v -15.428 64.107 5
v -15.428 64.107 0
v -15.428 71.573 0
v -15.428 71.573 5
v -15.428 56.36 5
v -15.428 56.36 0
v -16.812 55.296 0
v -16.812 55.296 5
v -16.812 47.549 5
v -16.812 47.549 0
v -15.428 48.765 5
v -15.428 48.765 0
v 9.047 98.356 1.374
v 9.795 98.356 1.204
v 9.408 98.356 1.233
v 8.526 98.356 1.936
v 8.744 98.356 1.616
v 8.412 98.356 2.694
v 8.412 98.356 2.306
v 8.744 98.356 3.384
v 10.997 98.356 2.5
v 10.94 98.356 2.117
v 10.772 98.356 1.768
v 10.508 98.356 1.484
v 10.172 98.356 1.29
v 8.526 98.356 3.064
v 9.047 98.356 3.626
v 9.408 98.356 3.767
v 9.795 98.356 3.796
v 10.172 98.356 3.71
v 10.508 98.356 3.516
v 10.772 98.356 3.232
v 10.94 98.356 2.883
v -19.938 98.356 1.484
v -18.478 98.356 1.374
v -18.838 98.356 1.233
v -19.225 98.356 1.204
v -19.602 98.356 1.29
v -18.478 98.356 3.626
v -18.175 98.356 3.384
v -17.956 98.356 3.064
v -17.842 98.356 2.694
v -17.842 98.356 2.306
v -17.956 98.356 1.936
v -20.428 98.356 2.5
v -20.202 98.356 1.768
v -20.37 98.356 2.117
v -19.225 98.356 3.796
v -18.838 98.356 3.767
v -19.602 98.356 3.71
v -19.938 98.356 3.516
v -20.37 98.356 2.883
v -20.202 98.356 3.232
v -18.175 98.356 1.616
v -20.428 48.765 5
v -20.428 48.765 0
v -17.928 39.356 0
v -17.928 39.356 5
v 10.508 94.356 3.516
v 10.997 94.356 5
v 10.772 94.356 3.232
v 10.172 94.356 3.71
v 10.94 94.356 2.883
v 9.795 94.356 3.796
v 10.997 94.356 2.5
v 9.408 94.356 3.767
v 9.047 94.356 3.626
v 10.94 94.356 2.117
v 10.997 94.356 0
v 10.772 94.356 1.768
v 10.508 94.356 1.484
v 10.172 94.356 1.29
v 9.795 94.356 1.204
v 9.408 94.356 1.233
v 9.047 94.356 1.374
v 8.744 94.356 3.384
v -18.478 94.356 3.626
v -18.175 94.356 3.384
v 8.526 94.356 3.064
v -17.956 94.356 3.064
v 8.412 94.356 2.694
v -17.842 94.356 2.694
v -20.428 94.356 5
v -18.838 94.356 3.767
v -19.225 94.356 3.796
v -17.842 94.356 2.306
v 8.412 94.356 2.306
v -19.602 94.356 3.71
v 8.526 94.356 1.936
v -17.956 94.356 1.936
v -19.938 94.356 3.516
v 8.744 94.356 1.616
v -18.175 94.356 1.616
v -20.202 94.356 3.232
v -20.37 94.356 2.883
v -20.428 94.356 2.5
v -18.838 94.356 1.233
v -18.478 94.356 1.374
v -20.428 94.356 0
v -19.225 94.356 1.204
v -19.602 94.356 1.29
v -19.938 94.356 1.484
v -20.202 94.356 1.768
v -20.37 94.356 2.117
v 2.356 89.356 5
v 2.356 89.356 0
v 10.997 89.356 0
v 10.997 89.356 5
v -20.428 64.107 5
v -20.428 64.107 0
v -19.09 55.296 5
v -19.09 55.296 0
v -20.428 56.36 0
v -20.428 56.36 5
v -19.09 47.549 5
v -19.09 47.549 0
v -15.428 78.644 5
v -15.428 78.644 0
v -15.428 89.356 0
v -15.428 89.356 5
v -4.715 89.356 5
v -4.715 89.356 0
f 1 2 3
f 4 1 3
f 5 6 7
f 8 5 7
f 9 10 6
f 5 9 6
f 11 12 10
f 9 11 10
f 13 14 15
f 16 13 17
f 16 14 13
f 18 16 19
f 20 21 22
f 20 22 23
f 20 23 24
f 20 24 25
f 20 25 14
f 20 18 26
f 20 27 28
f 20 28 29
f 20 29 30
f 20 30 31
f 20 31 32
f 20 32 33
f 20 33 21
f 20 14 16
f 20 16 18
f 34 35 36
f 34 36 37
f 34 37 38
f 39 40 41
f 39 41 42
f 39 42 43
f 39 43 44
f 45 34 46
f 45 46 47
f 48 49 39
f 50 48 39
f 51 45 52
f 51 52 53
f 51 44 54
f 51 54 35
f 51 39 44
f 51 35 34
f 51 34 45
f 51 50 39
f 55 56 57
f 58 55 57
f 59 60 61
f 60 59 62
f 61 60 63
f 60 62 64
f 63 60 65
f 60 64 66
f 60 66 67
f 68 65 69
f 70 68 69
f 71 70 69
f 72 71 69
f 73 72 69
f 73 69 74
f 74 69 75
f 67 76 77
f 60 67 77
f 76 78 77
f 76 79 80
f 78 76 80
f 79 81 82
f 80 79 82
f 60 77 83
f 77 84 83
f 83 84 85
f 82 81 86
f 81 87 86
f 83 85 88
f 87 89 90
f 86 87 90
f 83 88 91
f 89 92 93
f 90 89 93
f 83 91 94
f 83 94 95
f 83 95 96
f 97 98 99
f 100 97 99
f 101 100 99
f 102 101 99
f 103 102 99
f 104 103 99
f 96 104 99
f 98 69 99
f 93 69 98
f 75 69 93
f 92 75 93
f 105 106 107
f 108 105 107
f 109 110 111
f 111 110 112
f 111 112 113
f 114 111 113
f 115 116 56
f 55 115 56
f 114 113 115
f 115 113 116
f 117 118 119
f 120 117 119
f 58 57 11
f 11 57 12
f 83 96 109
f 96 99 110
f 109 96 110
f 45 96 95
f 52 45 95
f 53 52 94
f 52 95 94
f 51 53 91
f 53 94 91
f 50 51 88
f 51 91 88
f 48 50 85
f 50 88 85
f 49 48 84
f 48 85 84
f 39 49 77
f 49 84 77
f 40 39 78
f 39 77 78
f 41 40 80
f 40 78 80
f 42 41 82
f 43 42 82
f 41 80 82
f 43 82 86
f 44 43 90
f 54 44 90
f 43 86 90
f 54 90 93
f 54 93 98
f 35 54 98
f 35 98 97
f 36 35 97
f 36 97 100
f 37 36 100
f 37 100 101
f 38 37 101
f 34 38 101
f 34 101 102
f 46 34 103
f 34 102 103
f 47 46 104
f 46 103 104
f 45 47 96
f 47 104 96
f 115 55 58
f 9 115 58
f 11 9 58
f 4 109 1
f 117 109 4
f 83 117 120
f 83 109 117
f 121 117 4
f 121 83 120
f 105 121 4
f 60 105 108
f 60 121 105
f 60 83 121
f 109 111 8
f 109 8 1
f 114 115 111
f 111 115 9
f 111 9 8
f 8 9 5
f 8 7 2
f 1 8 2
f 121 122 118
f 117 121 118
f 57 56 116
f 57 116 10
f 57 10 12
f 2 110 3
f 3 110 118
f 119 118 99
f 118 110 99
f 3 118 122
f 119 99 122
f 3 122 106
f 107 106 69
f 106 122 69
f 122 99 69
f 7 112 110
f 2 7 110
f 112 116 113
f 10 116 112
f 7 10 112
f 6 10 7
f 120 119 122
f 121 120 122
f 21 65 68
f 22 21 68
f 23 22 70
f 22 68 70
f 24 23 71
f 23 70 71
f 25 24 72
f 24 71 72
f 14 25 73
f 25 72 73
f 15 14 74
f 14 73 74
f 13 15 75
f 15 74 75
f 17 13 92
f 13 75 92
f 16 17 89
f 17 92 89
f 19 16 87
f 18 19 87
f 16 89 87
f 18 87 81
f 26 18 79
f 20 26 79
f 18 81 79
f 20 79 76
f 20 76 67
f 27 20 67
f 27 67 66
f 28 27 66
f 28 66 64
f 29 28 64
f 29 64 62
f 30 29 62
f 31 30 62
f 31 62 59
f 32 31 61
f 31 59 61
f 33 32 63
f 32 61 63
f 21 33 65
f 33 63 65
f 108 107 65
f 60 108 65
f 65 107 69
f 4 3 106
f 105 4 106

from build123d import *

# Parameters (mm, degrees)
F2_DEPTH = 5
F4_DEPTH = 4
F6_DEPTH = 5


with BuildPart() as f2:
    # F1 (on Top) → F2 (new body)
    with BuildSketch(Plane.XY):
        Polygon((-20.4275340124, 94.3563715087), (-20.4275340124, 89.3563715087), (-15.4275340124, 89.3563715087), (-4.7150340124, 89.3563715087), (2.3560337995, 89.3563715087), (10.9974659876, 89.3563715087), (10.9974659876, 94.3563715087), align=None)
        Polygon((-15.4275340124, 89.3563715087), (-20.4275340124, 89.3563715087), (-20.4275340124, 39.3563715087), (-15.4275340124, 39.3563715087), (-15.4275340124, 71.5728036968), (-15.4275340124, 78.6438715087), align=None)
        Polygon((-4.7150340124, 89.3563715087), (-15.4275340124, 78.6438715087), (-15.4275340124, 71.5728036968), (2.3560337995, 89.3563715087), align=None)
    extrude(amount=F2_DEPTH)

    # F3 (on face) → F4 (join)
    with BuildSketch(Plane(origin=(0, 94.3563715087, 0), x_dir=(-1, 0, 0), z_dir=(0, 1, 0))):
        with BuildLine():
            ThreePointArc((-8.3974659876, 2.5), (-9.6974659876, 3.8), (-10.9974659876, 2.5))
            Line((-10.9974659876, 2.5), (-8.3974659876, 2.5))
        make_face()
        with BuildLine():
            Line((-8.3974659876, 2.5), (-10.9974659876, 2.5))
            ThreePointArc((-10.9974659876, 2.5), (-9.6974659876, 1.2), (-8.3974659876, 2.5))
        make_face()
        with BuildLine():
            Line((20.4275340124, 2.5), (17.8275340124, 2.5))
            ThreePointArc((17.8275340124, 2.5), (19.1275340124, 1.2), (20.4275340124, 2.5))
        make_face()
        with BuildLine():
            ThreePointArc((20.4275340124, 2.5), (19.1275340124, 3.8), (17.8275340124, 2.5))
            Line((17.8275340124, 2.5), (20.4275340124, 2.5))
        make_face()
    extrude(amount=F4_DEPTH)

    # F5 (on face) → F6 (cut, through all)
    with BuildSketch(Plane(origin=(0, 0, 0), x_dir=(1, 0, 0), z_dir=(0, 0, -1))):
        Polygon((-15.4275340124, -39.3563715087), (-17.9275340124, -39.3563715087), (-15.4275340124, -48.7645578384), align=None)
        Polygon((-20.4275340124, -48.7645578384), (-17.9275340124, -39.3563715087), (-20.4275340124, -39.3563715087), align=None)
        Polygon((-19.0904904157, -47.5493085384), (-20.4275340124, -48.7645578384), (-20.4275340124, -56.3598138094), align=None)
        Polygon((-15.4275340124, -56.3598138094), (-15.4275340124, -48.7645578384), (-16.8119128793, -47.5493085384), align=None)
        Polygon((-15.4275340124, -64.1069722176), (-15.4275340124, -56.3598138094), (-16.8119128793, -55.2964669466), align=None)
        Polygon((-19.0904904157, -55.2964669466), (-20.4275340124, -56.3598138094), (-20.4275340124, -64.1069722176), align=None)
    extrude(amount=-F6_DEPTH, mode=Mode.SUBTRACT)


solid = f2.part
